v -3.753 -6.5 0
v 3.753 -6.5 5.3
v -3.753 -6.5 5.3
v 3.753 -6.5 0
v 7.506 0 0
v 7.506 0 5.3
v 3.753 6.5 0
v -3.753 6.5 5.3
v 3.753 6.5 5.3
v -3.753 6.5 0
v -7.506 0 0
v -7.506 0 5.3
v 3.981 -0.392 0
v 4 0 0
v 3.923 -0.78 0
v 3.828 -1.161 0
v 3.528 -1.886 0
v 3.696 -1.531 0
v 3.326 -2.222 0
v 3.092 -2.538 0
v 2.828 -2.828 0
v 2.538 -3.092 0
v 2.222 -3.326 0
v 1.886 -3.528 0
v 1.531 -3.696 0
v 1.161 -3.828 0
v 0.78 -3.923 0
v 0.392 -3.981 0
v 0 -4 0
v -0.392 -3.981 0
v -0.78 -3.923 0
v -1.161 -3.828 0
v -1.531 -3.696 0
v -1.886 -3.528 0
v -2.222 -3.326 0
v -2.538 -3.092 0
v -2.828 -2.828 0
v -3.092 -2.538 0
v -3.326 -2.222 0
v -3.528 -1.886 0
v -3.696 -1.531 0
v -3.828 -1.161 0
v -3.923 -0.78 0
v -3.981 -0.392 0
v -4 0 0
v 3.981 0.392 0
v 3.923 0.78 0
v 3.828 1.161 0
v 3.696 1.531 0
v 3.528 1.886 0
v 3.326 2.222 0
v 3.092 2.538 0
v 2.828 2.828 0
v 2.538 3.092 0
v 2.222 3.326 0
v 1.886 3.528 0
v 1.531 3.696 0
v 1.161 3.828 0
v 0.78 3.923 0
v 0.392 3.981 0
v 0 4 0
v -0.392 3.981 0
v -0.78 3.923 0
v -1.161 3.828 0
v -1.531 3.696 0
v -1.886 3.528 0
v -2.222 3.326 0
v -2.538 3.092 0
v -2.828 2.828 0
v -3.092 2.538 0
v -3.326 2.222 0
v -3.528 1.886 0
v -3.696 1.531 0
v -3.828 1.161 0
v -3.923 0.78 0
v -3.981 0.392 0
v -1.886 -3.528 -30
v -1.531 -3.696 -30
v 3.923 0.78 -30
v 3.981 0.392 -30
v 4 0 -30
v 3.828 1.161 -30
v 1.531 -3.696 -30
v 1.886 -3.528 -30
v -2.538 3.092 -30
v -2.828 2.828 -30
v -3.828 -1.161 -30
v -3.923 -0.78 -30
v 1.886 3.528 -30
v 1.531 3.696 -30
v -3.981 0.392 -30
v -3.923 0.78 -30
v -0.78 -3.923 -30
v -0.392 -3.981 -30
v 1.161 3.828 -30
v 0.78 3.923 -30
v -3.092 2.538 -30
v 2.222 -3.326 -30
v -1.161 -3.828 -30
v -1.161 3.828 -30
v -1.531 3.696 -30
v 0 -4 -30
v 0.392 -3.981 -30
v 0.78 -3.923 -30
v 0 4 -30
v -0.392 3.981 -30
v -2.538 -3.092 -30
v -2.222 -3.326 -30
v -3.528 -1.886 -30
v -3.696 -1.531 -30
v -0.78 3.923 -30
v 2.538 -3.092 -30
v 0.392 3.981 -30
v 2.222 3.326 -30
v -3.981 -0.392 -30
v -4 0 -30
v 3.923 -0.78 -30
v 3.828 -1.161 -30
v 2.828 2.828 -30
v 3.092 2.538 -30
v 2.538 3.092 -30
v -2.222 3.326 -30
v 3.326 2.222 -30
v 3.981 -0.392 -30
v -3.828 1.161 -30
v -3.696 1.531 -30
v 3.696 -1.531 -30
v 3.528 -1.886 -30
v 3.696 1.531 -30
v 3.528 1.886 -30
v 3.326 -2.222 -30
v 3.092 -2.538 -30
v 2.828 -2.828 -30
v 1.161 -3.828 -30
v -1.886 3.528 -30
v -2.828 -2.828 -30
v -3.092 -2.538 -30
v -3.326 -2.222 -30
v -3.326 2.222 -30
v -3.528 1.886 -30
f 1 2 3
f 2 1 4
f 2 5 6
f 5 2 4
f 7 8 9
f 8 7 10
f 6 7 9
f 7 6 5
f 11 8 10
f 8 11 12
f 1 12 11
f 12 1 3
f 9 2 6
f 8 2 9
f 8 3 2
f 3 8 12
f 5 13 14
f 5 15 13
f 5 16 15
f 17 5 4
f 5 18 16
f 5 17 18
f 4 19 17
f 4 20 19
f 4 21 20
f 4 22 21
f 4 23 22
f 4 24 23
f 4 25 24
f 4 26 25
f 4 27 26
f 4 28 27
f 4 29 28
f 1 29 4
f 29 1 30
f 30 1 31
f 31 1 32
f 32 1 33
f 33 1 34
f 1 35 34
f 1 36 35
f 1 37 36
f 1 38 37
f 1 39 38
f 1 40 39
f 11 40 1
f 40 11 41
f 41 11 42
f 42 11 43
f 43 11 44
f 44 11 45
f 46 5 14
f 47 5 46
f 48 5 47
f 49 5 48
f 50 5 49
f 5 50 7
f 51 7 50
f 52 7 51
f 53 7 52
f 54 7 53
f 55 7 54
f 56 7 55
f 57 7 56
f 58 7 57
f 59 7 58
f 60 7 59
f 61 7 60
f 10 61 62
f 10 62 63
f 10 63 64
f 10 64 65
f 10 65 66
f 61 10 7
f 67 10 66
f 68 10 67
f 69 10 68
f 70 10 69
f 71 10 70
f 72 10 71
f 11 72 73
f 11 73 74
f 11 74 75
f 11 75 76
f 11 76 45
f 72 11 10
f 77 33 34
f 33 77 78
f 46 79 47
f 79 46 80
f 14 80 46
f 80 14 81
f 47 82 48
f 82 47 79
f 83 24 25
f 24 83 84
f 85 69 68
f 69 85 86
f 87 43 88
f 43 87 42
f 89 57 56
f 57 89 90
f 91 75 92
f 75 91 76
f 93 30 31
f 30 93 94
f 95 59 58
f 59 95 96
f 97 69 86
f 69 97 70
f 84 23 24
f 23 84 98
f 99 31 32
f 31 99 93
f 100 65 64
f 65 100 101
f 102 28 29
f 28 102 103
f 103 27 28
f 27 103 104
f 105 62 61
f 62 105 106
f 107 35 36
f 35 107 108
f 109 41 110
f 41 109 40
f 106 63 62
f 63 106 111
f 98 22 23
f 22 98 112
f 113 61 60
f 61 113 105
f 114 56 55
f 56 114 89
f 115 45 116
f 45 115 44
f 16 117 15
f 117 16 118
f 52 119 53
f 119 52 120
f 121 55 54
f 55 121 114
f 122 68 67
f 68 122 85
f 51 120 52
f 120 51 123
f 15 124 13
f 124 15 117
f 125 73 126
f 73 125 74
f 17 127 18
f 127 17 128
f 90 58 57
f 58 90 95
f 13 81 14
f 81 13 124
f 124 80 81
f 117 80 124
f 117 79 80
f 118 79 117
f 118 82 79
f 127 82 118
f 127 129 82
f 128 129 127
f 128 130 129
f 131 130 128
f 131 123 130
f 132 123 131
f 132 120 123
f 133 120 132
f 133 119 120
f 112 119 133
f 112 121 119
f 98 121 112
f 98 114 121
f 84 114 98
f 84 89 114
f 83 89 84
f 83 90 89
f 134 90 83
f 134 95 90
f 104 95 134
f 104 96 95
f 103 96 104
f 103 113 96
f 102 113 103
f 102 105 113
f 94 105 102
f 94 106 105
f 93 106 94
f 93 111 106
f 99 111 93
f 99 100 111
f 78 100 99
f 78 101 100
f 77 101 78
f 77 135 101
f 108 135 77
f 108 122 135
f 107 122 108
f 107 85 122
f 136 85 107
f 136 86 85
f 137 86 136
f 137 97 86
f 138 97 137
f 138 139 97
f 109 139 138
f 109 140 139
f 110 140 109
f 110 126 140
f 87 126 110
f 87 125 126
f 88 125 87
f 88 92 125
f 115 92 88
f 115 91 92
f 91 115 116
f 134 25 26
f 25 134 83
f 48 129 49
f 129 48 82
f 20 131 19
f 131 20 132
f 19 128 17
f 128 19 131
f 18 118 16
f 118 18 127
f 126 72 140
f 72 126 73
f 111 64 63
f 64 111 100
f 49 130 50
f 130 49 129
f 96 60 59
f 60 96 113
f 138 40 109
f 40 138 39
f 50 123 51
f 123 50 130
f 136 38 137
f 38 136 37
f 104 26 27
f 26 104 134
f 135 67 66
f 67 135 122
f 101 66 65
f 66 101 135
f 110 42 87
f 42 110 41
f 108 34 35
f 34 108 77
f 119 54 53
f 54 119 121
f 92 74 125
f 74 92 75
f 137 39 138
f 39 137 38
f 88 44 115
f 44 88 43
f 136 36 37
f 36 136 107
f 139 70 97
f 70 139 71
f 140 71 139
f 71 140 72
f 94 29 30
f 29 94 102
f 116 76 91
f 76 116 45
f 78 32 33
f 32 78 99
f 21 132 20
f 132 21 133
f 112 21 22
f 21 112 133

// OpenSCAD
// M8 hex bolt (simplified, no threads)

af            = 13;   // across-flats of hex head [mm]
head_height   = 5.3;  // head height [mm]
shank_d       = 8;    // shank diameter [mm]
shank_length  = 30;   // shank length [mm]

hex_r = af / sqrt(3); // circumradius for the hex head

union() {
    // Hexagonal head (extends in +Z)
    cylinder(h = head_height, r = hex_r, $fn = 6);

    // Cylindrical shank (extends in –Z)
    translate([0, 0, -shank_length])
        cylinder(h = shank_length, d = shank_d, $fn = 64);
}
